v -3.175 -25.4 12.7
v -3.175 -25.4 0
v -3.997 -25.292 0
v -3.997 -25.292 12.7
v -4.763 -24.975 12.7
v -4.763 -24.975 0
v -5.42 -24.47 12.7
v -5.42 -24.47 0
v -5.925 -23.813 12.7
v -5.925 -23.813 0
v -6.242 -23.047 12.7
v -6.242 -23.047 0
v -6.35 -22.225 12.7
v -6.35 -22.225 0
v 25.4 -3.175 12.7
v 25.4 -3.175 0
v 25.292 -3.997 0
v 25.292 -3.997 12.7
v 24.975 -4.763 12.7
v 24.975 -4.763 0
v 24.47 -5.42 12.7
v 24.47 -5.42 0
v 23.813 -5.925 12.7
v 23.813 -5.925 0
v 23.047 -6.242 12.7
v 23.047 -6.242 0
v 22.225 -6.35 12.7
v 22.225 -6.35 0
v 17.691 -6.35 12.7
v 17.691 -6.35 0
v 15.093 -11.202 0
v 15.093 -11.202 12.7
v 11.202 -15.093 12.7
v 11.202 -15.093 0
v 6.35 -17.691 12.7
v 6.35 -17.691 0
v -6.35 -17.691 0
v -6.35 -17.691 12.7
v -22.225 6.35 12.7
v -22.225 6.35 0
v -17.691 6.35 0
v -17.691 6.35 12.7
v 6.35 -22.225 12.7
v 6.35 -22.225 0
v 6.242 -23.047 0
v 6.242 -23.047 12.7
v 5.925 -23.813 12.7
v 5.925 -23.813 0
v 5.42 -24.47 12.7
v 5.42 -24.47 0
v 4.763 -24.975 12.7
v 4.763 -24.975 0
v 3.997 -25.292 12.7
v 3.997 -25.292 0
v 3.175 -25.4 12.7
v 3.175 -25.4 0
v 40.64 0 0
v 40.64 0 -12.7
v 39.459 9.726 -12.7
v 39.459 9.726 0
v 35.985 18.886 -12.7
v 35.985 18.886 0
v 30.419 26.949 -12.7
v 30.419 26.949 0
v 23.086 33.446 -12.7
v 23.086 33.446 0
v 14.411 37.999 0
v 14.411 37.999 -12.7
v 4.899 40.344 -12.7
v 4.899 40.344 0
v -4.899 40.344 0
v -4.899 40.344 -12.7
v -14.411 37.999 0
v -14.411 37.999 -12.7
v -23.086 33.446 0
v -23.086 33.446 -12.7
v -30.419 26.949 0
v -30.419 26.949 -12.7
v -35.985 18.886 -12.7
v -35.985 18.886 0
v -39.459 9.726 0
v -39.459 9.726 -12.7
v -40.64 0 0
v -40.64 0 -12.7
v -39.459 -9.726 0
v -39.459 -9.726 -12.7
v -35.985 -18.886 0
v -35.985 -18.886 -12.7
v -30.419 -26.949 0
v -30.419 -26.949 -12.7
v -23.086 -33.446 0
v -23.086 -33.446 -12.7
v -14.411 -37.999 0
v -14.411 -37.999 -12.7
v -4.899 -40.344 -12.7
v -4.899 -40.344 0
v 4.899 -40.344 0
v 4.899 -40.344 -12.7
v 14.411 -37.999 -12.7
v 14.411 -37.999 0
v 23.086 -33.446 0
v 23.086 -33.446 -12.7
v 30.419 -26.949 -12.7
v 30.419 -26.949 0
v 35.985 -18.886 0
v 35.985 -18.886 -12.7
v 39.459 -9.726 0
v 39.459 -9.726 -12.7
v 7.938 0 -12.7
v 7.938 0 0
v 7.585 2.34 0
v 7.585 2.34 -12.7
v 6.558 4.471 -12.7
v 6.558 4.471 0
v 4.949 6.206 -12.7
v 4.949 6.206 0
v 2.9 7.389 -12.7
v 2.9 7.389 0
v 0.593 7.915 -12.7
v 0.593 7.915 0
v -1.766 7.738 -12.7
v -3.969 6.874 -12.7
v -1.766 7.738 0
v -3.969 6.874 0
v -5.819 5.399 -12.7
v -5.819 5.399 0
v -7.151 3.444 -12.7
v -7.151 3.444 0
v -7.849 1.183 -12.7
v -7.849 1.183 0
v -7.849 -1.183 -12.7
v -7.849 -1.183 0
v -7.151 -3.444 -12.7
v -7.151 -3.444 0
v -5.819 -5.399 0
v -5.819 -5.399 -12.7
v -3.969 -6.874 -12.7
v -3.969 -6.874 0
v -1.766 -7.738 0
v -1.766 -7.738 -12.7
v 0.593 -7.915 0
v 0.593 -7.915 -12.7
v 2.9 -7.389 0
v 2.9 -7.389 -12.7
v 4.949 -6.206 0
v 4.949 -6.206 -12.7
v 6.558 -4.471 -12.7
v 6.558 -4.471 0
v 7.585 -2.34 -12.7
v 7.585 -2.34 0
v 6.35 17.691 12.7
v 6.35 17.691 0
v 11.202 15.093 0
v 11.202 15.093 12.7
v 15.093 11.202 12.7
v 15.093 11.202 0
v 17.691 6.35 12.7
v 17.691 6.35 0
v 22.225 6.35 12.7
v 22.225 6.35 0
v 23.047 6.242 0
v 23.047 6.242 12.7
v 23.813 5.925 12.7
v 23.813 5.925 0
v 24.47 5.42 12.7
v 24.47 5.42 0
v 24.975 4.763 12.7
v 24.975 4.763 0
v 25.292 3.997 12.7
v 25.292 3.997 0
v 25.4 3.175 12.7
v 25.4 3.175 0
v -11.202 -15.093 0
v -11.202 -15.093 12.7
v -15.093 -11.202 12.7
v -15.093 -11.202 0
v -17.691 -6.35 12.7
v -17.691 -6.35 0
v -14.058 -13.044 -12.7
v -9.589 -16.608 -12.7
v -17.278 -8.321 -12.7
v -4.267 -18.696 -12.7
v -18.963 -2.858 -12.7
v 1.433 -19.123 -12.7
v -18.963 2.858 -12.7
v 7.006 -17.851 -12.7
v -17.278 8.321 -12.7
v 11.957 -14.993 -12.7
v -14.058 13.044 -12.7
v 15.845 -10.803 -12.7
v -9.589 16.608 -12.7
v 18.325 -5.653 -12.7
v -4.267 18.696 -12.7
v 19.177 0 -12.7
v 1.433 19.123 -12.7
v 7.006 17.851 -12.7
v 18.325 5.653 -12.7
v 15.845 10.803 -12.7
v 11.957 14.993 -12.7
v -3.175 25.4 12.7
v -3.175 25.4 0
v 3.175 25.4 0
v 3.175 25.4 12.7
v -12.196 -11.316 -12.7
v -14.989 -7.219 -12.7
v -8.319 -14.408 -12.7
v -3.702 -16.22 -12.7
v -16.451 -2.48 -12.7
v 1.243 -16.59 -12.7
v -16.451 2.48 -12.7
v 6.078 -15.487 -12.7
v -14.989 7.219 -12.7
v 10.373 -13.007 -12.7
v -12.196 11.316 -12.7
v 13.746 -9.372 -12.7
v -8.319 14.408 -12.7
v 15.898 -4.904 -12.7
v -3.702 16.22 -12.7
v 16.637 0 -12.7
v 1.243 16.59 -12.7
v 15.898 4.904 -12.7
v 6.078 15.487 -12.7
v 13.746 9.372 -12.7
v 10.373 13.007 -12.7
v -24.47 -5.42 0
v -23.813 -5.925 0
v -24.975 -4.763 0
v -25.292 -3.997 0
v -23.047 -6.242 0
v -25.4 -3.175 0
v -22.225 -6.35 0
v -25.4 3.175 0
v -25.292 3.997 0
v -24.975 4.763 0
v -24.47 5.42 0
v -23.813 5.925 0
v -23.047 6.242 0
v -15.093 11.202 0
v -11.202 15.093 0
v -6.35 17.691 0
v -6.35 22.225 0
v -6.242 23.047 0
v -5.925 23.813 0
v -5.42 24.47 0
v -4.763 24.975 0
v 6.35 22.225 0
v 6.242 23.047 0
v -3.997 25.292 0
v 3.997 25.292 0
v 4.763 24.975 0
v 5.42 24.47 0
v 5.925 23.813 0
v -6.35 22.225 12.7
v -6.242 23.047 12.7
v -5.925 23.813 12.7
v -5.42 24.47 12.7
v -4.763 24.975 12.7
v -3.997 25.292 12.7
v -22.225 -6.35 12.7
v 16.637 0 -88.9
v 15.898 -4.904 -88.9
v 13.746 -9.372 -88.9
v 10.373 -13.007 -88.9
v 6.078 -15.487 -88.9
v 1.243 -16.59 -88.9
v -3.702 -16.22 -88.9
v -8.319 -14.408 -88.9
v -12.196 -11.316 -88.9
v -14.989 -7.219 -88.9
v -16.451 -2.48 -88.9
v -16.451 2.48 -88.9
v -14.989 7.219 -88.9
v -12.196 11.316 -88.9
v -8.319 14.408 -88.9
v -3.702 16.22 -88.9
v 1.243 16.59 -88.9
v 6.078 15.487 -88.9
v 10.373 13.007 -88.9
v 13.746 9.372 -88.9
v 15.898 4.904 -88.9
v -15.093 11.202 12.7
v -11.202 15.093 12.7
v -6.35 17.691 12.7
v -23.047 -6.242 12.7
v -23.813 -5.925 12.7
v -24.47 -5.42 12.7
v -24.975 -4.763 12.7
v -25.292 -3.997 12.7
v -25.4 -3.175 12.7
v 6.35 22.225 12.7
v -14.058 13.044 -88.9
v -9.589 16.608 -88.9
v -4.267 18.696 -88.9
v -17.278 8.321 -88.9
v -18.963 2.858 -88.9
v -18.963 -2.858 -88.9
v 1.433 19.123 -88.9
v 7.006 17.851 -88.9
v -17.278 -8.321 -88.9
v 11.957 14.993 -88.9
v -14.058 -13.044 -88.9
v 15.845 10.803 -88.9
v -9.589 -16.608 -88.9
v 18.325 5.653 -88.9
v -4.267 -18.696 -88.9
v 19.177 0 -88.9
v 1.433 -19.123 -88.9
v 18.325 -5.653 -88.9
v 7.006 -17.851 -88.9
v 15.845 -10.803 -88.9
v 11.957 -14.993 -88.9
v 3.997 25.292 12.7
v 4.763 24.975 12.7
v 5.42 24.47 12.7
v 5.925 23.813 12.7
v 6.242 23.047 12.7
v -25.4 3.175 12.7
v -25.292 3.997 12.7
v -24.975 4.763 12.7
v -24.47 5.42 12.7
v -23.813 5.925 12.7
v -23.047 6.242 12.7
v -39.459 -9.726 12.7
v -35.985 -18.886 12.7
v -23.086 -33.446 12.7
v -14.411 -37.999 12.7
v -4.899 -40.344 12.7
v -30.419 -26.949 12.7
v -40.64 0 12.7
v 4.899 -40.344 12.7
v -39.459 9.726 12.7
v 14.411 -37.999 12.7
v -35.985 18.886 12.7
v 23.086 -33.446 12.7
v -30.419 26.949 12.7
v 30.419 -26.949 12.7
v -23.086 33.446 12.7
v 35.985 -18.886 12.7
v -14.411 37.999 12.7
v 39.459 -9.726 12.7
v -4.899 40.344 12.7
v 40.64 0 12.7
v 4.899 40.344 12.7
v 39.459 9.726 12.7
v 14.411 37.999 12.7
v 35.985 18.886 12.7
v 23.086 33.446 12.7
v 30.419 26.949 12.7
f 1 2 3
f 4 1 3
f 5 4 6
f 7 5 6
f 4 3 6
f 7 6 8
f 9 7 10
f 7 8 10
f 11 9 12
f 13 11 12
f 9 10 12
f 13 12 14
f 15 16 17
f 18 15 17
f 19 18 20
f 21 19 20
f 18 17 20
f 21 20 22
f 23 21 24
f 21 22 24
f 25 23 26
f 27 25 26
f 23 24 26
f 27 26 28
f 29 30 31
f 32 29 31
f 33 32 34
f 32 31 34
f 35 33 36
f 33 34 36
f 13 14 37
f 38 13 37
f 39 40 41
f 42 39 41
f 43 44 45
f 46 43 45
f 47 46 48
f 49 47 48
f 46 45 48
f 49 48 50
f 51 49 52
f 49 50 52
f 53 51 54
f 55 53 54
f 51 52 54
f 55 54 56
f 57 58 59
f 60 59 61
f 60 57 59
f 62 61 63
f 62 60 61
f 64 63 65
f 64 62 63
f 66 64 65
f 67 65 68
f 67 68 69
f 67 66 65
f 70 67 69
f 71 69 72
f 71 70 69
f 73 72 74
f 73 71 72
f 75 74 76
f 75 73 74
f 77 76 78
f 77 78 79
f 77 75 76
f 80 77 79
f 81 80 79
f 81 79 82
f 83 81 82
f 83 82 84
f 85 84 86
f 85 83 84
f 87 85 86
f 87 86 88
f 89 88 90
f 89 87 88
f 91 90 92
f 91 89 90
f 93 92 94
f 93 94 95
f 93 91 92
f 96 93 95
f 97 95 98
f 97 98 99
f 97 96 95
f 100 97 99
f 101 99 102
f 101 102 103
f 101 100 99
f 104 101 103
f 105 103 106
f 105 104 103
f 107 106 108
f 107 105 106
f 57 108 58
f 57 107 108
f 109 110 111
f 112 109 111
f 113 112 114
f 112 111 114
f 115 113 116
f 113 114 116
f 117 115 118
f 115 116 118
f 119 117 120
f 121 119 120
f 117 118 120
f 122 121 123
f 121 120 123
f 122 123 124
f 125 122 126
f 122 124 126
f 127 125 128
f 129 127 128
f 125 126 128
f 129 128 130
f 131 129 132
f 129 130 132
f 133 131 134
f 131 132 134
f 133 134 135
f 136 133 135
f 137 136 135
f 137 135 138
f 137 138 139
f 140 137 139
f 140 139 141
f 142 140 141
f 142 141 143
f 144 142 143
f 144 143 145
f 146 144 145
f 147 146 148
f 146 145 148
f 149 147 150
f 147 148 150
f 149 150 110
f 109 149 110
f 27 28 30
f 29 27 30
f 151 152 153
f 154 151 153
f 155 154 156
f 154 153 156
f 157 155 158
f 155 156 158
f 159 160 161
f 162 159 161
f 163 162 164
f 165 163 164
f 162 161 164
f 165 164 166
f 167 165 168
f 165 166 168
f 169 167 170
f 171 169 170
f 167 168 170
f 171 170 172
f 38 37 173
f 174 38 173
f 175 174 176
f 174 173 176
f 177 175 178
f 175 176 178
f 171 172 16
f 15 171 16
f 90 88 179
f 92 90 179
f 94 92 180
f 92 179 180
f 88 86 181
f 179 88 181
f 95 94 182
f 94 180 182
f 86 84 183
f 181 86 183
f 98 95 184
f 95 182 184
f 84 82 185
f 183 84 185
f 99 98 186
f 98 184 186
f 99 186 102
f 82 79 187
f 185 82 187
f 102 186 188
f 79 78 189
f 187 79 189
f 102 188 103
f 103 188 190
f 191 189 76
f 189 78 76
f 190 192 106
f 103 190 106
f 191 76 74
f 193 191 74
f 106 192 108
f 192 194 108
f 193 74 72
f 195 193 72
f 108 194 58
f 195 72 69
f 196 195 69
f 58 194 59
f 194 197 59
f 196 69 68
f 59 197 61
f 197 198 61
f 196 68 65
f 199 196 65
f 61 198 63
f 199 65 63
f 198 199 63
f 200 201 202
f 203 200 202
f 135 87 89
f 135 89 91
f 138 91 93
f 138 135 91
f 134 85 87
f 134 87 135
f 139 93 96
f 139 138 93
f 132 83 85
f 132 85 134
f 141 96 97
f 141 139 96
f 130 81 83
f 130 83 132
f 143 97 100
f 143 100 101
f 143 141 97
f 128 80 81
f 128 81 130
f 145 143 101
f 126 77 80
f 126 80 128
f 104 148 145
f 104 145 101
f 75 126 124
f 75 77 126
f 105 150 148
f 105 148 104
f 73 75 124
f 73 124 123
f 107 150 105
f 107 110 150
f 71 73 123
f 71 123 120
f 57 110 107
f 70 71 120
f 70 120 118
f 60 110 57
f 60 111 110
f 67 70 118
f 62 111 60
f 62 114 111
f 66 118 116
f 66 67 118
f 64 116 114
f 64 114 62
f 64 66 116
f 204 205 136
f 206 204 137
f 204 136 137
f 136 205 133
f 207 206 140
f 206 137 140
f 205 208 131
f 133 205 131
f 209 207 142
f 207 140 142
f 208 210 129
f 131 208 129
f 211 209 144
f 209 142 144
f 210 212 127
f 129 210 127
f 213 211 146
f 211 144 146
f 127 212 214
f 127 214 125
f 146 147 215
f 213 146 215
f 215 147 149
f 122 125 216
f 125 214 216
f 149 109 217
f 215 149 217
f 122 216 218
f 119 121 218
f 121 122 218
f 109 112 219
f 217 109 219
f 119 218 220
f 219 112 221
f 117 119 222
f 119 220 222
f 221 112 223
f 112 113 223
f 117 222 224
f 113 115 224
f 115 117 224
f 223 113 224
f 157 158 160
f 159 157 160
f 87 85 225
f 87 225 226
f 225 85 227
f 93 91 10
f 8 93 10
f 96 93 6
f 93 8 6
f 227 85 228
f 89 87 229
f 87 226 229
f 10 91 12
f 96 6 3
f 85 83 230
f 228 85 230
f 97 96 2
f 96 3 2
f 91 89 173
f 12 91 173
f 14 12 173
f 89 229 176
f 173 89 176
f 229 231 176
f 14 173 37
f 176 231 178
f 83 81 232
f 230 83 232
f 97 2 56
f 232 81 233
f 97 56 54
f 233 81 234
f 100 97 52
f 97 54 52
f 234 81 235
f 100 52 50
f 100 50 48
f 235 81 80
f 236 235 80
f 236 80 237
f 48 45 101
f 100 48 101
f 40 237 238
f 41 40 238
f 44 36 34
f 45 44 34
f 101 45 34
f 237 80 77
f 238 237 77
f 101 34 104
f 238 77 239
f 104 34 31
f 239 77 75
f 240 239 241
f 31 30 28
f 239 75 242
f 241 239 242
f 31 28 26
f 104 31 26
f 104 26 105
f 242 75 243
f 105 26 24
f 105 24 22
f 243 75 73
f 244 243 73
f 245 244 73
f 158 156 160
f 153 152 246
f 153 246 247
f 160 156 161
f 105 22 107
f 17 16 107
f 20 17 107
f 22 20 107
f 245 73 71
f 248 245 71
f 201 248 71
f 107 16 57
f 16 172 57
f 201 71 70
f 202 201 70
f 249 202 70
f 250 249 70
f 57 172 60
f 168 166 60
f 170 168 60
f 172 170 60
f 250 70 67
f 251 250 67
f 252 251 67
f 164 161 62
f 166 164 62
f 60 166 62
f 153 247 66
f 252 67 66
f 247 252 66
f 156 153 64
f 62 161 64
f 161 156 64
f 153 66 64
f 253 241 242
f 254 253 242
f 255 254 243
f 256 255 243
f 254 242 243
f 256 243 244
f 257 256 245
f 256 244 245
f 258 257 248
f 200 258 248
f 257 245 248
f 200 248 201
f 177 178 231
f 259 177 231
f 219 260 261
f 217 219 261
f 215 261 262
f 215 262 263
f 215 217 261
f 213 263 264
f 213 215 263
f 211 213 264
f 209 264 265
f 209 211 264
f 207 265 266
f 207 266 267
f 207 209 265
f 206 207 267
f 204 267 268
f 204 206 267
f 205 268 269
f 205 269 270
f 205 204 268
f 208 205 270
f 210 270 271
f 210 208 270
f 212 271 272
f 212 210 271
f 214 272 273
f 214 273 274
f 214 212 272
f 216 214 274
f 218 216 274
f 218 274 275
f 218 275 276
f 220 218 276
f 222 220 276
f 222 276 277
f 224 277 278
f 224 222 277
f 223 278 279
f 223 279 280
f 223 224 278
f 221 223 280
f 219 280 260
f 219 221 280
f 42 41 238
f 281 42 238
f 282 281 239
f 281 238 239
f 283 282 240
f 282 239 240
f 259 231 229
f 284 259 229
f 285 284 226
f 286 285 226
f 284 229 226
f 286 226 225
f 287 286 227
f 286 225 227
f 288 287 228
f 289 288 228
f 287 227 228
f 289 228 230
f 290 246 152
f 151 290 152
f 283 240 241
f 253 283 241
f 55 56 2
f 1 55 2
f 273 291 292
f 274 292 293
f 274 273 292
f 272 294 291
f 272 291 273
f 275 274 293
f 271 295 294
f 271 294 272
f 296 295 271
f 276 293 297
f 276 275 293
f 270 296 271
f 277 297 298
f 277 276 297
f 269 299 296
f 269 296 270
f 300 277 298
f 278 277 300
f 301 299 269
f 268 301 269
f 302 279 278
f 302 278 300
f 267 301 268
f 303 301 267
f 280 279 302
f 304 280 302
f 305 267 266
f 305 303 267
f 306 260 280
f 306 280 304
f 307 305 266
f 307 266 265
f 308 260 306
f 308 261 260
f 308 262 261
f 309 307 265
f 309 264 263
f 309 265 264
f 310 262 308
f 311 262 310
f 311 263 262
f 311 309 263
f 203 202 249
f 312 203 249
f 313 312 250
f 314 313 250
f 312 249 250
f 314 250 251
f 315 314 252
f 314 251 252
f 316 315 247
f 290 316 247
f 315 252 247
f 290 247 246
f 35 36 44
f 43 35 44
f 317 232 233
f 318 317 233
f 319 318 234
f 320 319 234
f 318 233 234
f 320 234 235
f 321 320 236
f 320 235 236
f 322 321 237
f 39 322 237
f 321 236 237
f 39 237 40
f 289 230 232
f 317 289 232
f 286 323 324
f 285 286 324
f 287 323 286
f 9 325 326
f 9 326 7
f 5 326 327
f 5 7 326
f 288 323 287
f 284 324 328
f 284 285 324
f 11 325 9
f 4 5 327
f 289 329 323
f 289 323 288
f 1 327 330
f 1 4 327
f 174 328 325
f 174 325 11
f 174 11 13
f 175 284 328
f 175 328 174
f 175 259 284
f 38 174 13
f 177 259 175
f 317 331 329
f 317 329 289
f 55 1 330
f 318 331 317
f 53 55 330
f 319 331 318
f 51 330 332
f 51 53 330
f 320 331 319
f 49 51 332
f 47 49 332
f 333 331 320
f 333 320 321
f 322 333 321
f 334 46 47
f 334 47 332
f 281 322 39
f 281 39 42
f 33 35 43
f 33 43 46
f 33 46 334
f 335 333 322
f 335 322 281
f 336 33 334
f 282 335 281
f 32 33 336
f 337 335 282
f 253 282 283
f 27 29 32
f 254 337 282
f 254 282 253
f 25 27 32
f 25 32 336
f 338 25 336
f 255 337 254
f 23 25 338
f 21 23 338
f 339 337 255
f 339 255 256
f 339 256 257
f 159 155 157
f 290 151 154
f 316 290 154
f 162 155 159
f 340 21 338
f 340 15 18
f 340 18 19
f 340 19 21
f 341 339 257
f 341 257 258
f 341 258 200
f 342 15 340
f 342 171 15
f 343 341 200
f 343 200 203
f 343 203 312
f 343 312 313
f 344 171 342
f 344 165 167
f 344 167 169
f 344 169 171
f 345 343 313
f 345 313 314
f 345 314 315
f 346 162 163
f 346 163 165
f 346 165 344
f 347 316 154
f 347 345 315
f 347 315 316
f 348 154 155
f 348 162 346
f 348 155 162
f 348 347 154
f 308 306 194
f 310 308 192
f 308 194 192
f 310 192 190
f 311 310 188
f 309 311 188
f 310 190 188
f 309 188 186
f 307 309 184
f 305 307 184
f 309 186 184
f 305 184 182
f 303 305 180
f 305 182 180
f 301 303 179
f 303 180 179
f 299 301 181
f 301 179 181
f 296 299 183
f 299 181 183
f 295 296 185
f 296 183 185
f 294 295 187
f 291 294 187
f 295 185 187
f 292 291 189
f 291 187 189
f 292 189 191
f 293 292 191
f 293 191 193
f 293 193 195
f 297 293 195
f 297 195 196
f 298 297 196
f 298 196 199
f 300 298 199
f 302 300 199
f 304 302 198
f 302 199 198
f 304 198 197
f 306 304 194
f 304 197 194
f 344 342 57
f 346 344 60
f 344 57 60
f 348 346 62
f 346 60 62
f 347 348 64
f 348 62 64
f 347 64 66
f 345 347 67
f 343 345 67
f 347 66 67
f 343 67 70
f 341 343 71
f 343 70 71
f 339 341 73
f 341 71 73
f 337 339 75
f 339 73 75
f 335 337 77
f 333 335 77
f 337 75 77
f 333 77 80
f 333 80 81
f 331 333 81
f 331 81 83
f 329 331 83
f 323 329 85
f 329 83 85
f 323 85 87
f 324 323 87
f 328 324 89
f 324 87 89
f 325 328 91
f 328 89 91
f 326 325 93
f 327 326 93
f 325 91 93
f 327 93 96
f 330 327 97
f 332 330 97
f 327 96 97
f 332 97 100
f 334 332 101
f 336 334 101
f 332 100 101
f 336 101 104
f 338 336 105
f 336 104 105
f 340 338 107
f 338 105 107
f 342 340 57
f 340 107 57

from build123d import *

# Parameters (mm, degrees)
F0_R     = 40.64
F1_DEPTH = 12.7
F0_R_2   = 7.9375
F2_DEPTH = 12.7
F3_R     = 19.177
F3_R_2   = 16.637
F4_DEPTH = 76.2


with BuildPart() as f1:
    # F0 (on Top) → F1 (new body)
    with BuildSketch(Plane.XY):
        Circle(F0_R)
        with BuildLine():
            ThreePointArc((6.35, 17.6908766318), (13.2907790592, 13.2907790592), (17.6908766318, 6.35))
            Line((17.6908766318, 6.35), (22.225, 6.35))
            ThreePointArc((22.225, 6.35), (24.4700640303, 5.4200640303), (25.4, 3.175))
            Line((25.4, 3.175), (25.4, -3.175))
            ThreePointArc((25.4, -3.175), (24.4700640303, -5.4200640303), (22.225, -6.35))
            Line((22.225, -6.35), (17.6908766318, -6.35))
            ThreePointArc((17.6908766318, -6.35), (13.2907790592, -13.2907790592), (6.35, -17.6908766318))
            Line((6.35, -17.6908766318), (6.35, -22.225))
            ThreePointArc((6.35, -22.225), (5.4200640303, -24.4700640303), (3.175, -25.4))
            Line((3.175, -25.4), (-3.175, -25.4))
            ThreePointArc((-3.175, -25.4), (-5.4200640303, -24.4700640303), (-6.35, -22.225))
            Line((-6.35, -22.225), (-6.35, -17.6908766318))
            ThreePointArc((-6.35, -17.6908766318), (-13.2907790592, -13.2907790592), (-17.6908766318, -6.35))
            Line((-17.6908766318, -6.35), (-22.225, -6.35))
            ThreePointArc((-22.225, -6.35), (-24.4700640303, -5.4200640303), (-25.4, -3.175))
            Line((-25.4, -3.175), (-25.4, 3.175))
            ThreePointArc((-25.4, 3.175), (-24.4700640303, 5.4200640303), (-22.225, 6.35))
            Line((-22.225, 6.35), (-17.6908766318, 6.35))
            ThreePointArc((-17.6908766318, 6.35), (-13.2907790592, 13.2907790592), (-6.35, 17.6908766318))
            Line((-6.35, 17.6908766318), (-6.35, 22.225))
            ThreePointArc((-6.35, 22.225), (-5.4200640303, 24.4700640303), (-3.175, 25.4))
            Line((-3.175, 25.4), (3.175, 25.4))
            ThreePointArc((3.175, 25.4), (5.4200640303, 24.4700640303), (6.35, 22.225))
            Line((6.35, 22.225), (6.35, 17.6908766318))
        make_face(mode=Mode.SUBTRACT)
    extrude(amount=F1_DEPTH)


with BuildPart() as f2:
    # F0 (on Top) → F2 (new body)
    with BuildSketch(Plane.XY):
        Circle(F0_R)
        with BuildLine():
            ThreePointArc((6.35, 17.6908766318), (13.2907790592, 13.2907790592), (17.6908766318, 6.35))
            Line((17.6908766318, 6.35), (22.225, 6.35))
            ThreePointArc((22.225, 6.35), (24.4700640303, 5.4200640303), (25.4, 3.175))
            Line((25.4, 3.175), (25.4, -3.175))
            ThreePointArc((25.4, -3.175), (24.4700640303, -5.4200640303), (22.225, -6.35))
            Line((22.225, -6.35), (17.6908766318, -6.35))
            ThreePointArc((17.6908766318, -6.35), (13.2907790592, -13.2907790592), (6.35, -17.6908766318))
            Line((6.35, -17.6908766318), (6.35, -22.225))
            ThreePointArc((6.35, -22.225), (5.4200640303, -24.4700640303), (3.175, -25.4))
            Line((3.175, -25.4), (-3.175, -25.4))
            ThreePointArc((-3.175, -25.4), (-5.4200640303, -24.4700640303), (-6.35, -22.225))
            Line((-6.35, -22.225), (-6.35, -17.6908766318))
            ThreePointArc((-6.35, -17.6908766318), (-13.2907790592, -13.2907790592), (-17.6908766318, -6.35))
            Line((-17.6908766318, -6.35), (-22.225, -6.35))
            ThreePointArc((-22.225, -6.35), (-24.4700640303, -5.4200640303), (-25.4, -3.175))
            Line((-25.4, -3.175), (-25.4, 3.175))
            ThreePointArc((-25.4, 3.175), (-24.4700640303, 5.4200640303), (-22.225, 6.35))
            Line((-22.225, 6.35), (-17.6908766318, 6.35))
            ThreePointArc((-17.6908766318, 6.35), (-13.2907790592, 13.2907790592), (-6.35, 17.6908766318))
            Line((-6.35, 17.6908766318), (-6.35, 22.225))
            ThreePointArc((-6.35, 22.225), (-5.4200640303, 24.4700640303), (-3.175, 25.4))
            Line((-3.175, 25.4), (3.175, 25.4))
            ThreePointArc((3.175, 25.4), (5.4200640303, 24.4700640303), (6.35, 22.225))
            Line((6.35, 22.225), (6.35, 17.6908766318))
        make_face(mode=Mode.SUBTRACT)
        with BuildLine():
            ThreePointArc((17.6908766318, -6.35), (18.5176582371, -3.2227239123), (18.796, 0))
            ThreePointArc((18.796, 0), (18.5176582371, 3.2227239123), (17.6908766318, 6.35))
            ThreePointArc((17.6908766318, 6.35), (13.2907790592, 13.2907790592), (6.35, 17.6908766318))
            ThreePointArc((6.35, 17.6908766318), (0, 18.796), (-6.35, 17.6908766318))
            ThreePointArc((-6.35, 17.6908766318), (-13.2907790592, 13.2907790592), (-17.6908766318, 6.35))
            ThreePointArc((-17.6908766318, 6.35), (-18.796, 0), (-17.6908766318, -6.35))
            ThreePointArc((-17.6908766318, -6.35), (-13.2907790592, -13.2907790592), (-6.35, -17.6908766318))
            ThreePointArc((-6.35, -17.6908766318), (0, -18.796), (6.35, -17.6908766318))
            ThreePointArc((6.35, -17.6908766318), (13.2907790592, -13.2907790592), (17.6908766318, -6.35))
        make_face()
        Circle(F0_R_2, mode=Mode.SUBTRACT)
        with BuildLine():
            ThreePointArc((-17.6908766318, -6.35), (-18.796, 0), (-17.6908766318, 6.35))
            Line((-17.6908766318, 6.35), (-22.225, 6.35))
            ThreePointArc((-22.225, 6.35), (-24.4700640303, 5.4200640303), (-25.4, 3.175))
            Line((-25.4, 3.175), (-25.4, -3.175))
            ThreePointArc((-25.4, -3.175), (-24.4700640303, -5.4200640303), (-22.225, -6.35))
            Line((-22.225, -6.35), (-17.6908766318, -6.35))
        make_face()
        with BuildLine():
            ThreePointArc((17.6908766318, 6.35), (18.5176582371, 3.2227239123), (18.796, 0))
            ThreePointArc((18.796, 0), (18.5176582371, -3.2227239123), (17.6908766318, -6.35))
            Line((17.6908766318, -6.35), (22.225, -6.35))
            ThreePointArc((22.225, -6.35), (24.4700640303, -5.4200640303), (25.4, -3.175))
            Line((25.4, -3.175), (25.4, 3.175))
            ThreePointArc((25.4, 3.175), (24.4700640303, 5.4200640303), (22.225, 6.35))
            Line((22.225, 6.35), (17.6908766318, 6.35))
        make_face()
        with BuildLine():
            Line((6.35, -22.225), (6.35, -17.6908766318))
            ThreePointArc((6.35, -17.6908766318), (0, -18.796), (-6.35, -17.6908766318))
            Line((-6.35, -17.6908766318), (-6.35, -22.225))
            ThreePointArc((-6.35, -22.225), (-5.4200640303, -24.4700640303), (-3.175, -25.4))
            Line((-3.175, -25.4), (3.175, -25.4))
            ThreePointArc((3.175, -25.4), (5.4200640303, -24.4700640303), (6.35, -22.225))
        make_face()
        with BuildLine():
            ThreePointArc((-6.35, 17.6908766318), (0, 18.796), (6.35, 17.6908766318))
            Line((6.35, 17.6908766318), (6.35, 22.225))
            ThreePointArc((6.35, 22.225), (5.4200640303, 24.4700640303), (3.175, 25.4))
            Line((3.175, 25.4), (-3.175, 25.4))
            ThreePointArc((-3.175, 25.4), (-5.4200640303, 24.4700640303), (-6.35, 22.225))
            Line((-6.35, 22.225), (-6.35, 17.6908766318))
        make_face()
    extrude(amount=-F2_DEPTH)

    # F3 (on face) → F4 (join)
    with BuildSketch(Plane(origin=(0, 0, -12.7), x_dir=(1, 0, 0), z_dir=(0, 0, -1))):
        Circle(F3_R)
        Circle(F3_R_2, mode=Mode.SUBTRACT)
    extrude(amount=F4_DEPTH)


solid = Compound([f1.part, f2.part])
